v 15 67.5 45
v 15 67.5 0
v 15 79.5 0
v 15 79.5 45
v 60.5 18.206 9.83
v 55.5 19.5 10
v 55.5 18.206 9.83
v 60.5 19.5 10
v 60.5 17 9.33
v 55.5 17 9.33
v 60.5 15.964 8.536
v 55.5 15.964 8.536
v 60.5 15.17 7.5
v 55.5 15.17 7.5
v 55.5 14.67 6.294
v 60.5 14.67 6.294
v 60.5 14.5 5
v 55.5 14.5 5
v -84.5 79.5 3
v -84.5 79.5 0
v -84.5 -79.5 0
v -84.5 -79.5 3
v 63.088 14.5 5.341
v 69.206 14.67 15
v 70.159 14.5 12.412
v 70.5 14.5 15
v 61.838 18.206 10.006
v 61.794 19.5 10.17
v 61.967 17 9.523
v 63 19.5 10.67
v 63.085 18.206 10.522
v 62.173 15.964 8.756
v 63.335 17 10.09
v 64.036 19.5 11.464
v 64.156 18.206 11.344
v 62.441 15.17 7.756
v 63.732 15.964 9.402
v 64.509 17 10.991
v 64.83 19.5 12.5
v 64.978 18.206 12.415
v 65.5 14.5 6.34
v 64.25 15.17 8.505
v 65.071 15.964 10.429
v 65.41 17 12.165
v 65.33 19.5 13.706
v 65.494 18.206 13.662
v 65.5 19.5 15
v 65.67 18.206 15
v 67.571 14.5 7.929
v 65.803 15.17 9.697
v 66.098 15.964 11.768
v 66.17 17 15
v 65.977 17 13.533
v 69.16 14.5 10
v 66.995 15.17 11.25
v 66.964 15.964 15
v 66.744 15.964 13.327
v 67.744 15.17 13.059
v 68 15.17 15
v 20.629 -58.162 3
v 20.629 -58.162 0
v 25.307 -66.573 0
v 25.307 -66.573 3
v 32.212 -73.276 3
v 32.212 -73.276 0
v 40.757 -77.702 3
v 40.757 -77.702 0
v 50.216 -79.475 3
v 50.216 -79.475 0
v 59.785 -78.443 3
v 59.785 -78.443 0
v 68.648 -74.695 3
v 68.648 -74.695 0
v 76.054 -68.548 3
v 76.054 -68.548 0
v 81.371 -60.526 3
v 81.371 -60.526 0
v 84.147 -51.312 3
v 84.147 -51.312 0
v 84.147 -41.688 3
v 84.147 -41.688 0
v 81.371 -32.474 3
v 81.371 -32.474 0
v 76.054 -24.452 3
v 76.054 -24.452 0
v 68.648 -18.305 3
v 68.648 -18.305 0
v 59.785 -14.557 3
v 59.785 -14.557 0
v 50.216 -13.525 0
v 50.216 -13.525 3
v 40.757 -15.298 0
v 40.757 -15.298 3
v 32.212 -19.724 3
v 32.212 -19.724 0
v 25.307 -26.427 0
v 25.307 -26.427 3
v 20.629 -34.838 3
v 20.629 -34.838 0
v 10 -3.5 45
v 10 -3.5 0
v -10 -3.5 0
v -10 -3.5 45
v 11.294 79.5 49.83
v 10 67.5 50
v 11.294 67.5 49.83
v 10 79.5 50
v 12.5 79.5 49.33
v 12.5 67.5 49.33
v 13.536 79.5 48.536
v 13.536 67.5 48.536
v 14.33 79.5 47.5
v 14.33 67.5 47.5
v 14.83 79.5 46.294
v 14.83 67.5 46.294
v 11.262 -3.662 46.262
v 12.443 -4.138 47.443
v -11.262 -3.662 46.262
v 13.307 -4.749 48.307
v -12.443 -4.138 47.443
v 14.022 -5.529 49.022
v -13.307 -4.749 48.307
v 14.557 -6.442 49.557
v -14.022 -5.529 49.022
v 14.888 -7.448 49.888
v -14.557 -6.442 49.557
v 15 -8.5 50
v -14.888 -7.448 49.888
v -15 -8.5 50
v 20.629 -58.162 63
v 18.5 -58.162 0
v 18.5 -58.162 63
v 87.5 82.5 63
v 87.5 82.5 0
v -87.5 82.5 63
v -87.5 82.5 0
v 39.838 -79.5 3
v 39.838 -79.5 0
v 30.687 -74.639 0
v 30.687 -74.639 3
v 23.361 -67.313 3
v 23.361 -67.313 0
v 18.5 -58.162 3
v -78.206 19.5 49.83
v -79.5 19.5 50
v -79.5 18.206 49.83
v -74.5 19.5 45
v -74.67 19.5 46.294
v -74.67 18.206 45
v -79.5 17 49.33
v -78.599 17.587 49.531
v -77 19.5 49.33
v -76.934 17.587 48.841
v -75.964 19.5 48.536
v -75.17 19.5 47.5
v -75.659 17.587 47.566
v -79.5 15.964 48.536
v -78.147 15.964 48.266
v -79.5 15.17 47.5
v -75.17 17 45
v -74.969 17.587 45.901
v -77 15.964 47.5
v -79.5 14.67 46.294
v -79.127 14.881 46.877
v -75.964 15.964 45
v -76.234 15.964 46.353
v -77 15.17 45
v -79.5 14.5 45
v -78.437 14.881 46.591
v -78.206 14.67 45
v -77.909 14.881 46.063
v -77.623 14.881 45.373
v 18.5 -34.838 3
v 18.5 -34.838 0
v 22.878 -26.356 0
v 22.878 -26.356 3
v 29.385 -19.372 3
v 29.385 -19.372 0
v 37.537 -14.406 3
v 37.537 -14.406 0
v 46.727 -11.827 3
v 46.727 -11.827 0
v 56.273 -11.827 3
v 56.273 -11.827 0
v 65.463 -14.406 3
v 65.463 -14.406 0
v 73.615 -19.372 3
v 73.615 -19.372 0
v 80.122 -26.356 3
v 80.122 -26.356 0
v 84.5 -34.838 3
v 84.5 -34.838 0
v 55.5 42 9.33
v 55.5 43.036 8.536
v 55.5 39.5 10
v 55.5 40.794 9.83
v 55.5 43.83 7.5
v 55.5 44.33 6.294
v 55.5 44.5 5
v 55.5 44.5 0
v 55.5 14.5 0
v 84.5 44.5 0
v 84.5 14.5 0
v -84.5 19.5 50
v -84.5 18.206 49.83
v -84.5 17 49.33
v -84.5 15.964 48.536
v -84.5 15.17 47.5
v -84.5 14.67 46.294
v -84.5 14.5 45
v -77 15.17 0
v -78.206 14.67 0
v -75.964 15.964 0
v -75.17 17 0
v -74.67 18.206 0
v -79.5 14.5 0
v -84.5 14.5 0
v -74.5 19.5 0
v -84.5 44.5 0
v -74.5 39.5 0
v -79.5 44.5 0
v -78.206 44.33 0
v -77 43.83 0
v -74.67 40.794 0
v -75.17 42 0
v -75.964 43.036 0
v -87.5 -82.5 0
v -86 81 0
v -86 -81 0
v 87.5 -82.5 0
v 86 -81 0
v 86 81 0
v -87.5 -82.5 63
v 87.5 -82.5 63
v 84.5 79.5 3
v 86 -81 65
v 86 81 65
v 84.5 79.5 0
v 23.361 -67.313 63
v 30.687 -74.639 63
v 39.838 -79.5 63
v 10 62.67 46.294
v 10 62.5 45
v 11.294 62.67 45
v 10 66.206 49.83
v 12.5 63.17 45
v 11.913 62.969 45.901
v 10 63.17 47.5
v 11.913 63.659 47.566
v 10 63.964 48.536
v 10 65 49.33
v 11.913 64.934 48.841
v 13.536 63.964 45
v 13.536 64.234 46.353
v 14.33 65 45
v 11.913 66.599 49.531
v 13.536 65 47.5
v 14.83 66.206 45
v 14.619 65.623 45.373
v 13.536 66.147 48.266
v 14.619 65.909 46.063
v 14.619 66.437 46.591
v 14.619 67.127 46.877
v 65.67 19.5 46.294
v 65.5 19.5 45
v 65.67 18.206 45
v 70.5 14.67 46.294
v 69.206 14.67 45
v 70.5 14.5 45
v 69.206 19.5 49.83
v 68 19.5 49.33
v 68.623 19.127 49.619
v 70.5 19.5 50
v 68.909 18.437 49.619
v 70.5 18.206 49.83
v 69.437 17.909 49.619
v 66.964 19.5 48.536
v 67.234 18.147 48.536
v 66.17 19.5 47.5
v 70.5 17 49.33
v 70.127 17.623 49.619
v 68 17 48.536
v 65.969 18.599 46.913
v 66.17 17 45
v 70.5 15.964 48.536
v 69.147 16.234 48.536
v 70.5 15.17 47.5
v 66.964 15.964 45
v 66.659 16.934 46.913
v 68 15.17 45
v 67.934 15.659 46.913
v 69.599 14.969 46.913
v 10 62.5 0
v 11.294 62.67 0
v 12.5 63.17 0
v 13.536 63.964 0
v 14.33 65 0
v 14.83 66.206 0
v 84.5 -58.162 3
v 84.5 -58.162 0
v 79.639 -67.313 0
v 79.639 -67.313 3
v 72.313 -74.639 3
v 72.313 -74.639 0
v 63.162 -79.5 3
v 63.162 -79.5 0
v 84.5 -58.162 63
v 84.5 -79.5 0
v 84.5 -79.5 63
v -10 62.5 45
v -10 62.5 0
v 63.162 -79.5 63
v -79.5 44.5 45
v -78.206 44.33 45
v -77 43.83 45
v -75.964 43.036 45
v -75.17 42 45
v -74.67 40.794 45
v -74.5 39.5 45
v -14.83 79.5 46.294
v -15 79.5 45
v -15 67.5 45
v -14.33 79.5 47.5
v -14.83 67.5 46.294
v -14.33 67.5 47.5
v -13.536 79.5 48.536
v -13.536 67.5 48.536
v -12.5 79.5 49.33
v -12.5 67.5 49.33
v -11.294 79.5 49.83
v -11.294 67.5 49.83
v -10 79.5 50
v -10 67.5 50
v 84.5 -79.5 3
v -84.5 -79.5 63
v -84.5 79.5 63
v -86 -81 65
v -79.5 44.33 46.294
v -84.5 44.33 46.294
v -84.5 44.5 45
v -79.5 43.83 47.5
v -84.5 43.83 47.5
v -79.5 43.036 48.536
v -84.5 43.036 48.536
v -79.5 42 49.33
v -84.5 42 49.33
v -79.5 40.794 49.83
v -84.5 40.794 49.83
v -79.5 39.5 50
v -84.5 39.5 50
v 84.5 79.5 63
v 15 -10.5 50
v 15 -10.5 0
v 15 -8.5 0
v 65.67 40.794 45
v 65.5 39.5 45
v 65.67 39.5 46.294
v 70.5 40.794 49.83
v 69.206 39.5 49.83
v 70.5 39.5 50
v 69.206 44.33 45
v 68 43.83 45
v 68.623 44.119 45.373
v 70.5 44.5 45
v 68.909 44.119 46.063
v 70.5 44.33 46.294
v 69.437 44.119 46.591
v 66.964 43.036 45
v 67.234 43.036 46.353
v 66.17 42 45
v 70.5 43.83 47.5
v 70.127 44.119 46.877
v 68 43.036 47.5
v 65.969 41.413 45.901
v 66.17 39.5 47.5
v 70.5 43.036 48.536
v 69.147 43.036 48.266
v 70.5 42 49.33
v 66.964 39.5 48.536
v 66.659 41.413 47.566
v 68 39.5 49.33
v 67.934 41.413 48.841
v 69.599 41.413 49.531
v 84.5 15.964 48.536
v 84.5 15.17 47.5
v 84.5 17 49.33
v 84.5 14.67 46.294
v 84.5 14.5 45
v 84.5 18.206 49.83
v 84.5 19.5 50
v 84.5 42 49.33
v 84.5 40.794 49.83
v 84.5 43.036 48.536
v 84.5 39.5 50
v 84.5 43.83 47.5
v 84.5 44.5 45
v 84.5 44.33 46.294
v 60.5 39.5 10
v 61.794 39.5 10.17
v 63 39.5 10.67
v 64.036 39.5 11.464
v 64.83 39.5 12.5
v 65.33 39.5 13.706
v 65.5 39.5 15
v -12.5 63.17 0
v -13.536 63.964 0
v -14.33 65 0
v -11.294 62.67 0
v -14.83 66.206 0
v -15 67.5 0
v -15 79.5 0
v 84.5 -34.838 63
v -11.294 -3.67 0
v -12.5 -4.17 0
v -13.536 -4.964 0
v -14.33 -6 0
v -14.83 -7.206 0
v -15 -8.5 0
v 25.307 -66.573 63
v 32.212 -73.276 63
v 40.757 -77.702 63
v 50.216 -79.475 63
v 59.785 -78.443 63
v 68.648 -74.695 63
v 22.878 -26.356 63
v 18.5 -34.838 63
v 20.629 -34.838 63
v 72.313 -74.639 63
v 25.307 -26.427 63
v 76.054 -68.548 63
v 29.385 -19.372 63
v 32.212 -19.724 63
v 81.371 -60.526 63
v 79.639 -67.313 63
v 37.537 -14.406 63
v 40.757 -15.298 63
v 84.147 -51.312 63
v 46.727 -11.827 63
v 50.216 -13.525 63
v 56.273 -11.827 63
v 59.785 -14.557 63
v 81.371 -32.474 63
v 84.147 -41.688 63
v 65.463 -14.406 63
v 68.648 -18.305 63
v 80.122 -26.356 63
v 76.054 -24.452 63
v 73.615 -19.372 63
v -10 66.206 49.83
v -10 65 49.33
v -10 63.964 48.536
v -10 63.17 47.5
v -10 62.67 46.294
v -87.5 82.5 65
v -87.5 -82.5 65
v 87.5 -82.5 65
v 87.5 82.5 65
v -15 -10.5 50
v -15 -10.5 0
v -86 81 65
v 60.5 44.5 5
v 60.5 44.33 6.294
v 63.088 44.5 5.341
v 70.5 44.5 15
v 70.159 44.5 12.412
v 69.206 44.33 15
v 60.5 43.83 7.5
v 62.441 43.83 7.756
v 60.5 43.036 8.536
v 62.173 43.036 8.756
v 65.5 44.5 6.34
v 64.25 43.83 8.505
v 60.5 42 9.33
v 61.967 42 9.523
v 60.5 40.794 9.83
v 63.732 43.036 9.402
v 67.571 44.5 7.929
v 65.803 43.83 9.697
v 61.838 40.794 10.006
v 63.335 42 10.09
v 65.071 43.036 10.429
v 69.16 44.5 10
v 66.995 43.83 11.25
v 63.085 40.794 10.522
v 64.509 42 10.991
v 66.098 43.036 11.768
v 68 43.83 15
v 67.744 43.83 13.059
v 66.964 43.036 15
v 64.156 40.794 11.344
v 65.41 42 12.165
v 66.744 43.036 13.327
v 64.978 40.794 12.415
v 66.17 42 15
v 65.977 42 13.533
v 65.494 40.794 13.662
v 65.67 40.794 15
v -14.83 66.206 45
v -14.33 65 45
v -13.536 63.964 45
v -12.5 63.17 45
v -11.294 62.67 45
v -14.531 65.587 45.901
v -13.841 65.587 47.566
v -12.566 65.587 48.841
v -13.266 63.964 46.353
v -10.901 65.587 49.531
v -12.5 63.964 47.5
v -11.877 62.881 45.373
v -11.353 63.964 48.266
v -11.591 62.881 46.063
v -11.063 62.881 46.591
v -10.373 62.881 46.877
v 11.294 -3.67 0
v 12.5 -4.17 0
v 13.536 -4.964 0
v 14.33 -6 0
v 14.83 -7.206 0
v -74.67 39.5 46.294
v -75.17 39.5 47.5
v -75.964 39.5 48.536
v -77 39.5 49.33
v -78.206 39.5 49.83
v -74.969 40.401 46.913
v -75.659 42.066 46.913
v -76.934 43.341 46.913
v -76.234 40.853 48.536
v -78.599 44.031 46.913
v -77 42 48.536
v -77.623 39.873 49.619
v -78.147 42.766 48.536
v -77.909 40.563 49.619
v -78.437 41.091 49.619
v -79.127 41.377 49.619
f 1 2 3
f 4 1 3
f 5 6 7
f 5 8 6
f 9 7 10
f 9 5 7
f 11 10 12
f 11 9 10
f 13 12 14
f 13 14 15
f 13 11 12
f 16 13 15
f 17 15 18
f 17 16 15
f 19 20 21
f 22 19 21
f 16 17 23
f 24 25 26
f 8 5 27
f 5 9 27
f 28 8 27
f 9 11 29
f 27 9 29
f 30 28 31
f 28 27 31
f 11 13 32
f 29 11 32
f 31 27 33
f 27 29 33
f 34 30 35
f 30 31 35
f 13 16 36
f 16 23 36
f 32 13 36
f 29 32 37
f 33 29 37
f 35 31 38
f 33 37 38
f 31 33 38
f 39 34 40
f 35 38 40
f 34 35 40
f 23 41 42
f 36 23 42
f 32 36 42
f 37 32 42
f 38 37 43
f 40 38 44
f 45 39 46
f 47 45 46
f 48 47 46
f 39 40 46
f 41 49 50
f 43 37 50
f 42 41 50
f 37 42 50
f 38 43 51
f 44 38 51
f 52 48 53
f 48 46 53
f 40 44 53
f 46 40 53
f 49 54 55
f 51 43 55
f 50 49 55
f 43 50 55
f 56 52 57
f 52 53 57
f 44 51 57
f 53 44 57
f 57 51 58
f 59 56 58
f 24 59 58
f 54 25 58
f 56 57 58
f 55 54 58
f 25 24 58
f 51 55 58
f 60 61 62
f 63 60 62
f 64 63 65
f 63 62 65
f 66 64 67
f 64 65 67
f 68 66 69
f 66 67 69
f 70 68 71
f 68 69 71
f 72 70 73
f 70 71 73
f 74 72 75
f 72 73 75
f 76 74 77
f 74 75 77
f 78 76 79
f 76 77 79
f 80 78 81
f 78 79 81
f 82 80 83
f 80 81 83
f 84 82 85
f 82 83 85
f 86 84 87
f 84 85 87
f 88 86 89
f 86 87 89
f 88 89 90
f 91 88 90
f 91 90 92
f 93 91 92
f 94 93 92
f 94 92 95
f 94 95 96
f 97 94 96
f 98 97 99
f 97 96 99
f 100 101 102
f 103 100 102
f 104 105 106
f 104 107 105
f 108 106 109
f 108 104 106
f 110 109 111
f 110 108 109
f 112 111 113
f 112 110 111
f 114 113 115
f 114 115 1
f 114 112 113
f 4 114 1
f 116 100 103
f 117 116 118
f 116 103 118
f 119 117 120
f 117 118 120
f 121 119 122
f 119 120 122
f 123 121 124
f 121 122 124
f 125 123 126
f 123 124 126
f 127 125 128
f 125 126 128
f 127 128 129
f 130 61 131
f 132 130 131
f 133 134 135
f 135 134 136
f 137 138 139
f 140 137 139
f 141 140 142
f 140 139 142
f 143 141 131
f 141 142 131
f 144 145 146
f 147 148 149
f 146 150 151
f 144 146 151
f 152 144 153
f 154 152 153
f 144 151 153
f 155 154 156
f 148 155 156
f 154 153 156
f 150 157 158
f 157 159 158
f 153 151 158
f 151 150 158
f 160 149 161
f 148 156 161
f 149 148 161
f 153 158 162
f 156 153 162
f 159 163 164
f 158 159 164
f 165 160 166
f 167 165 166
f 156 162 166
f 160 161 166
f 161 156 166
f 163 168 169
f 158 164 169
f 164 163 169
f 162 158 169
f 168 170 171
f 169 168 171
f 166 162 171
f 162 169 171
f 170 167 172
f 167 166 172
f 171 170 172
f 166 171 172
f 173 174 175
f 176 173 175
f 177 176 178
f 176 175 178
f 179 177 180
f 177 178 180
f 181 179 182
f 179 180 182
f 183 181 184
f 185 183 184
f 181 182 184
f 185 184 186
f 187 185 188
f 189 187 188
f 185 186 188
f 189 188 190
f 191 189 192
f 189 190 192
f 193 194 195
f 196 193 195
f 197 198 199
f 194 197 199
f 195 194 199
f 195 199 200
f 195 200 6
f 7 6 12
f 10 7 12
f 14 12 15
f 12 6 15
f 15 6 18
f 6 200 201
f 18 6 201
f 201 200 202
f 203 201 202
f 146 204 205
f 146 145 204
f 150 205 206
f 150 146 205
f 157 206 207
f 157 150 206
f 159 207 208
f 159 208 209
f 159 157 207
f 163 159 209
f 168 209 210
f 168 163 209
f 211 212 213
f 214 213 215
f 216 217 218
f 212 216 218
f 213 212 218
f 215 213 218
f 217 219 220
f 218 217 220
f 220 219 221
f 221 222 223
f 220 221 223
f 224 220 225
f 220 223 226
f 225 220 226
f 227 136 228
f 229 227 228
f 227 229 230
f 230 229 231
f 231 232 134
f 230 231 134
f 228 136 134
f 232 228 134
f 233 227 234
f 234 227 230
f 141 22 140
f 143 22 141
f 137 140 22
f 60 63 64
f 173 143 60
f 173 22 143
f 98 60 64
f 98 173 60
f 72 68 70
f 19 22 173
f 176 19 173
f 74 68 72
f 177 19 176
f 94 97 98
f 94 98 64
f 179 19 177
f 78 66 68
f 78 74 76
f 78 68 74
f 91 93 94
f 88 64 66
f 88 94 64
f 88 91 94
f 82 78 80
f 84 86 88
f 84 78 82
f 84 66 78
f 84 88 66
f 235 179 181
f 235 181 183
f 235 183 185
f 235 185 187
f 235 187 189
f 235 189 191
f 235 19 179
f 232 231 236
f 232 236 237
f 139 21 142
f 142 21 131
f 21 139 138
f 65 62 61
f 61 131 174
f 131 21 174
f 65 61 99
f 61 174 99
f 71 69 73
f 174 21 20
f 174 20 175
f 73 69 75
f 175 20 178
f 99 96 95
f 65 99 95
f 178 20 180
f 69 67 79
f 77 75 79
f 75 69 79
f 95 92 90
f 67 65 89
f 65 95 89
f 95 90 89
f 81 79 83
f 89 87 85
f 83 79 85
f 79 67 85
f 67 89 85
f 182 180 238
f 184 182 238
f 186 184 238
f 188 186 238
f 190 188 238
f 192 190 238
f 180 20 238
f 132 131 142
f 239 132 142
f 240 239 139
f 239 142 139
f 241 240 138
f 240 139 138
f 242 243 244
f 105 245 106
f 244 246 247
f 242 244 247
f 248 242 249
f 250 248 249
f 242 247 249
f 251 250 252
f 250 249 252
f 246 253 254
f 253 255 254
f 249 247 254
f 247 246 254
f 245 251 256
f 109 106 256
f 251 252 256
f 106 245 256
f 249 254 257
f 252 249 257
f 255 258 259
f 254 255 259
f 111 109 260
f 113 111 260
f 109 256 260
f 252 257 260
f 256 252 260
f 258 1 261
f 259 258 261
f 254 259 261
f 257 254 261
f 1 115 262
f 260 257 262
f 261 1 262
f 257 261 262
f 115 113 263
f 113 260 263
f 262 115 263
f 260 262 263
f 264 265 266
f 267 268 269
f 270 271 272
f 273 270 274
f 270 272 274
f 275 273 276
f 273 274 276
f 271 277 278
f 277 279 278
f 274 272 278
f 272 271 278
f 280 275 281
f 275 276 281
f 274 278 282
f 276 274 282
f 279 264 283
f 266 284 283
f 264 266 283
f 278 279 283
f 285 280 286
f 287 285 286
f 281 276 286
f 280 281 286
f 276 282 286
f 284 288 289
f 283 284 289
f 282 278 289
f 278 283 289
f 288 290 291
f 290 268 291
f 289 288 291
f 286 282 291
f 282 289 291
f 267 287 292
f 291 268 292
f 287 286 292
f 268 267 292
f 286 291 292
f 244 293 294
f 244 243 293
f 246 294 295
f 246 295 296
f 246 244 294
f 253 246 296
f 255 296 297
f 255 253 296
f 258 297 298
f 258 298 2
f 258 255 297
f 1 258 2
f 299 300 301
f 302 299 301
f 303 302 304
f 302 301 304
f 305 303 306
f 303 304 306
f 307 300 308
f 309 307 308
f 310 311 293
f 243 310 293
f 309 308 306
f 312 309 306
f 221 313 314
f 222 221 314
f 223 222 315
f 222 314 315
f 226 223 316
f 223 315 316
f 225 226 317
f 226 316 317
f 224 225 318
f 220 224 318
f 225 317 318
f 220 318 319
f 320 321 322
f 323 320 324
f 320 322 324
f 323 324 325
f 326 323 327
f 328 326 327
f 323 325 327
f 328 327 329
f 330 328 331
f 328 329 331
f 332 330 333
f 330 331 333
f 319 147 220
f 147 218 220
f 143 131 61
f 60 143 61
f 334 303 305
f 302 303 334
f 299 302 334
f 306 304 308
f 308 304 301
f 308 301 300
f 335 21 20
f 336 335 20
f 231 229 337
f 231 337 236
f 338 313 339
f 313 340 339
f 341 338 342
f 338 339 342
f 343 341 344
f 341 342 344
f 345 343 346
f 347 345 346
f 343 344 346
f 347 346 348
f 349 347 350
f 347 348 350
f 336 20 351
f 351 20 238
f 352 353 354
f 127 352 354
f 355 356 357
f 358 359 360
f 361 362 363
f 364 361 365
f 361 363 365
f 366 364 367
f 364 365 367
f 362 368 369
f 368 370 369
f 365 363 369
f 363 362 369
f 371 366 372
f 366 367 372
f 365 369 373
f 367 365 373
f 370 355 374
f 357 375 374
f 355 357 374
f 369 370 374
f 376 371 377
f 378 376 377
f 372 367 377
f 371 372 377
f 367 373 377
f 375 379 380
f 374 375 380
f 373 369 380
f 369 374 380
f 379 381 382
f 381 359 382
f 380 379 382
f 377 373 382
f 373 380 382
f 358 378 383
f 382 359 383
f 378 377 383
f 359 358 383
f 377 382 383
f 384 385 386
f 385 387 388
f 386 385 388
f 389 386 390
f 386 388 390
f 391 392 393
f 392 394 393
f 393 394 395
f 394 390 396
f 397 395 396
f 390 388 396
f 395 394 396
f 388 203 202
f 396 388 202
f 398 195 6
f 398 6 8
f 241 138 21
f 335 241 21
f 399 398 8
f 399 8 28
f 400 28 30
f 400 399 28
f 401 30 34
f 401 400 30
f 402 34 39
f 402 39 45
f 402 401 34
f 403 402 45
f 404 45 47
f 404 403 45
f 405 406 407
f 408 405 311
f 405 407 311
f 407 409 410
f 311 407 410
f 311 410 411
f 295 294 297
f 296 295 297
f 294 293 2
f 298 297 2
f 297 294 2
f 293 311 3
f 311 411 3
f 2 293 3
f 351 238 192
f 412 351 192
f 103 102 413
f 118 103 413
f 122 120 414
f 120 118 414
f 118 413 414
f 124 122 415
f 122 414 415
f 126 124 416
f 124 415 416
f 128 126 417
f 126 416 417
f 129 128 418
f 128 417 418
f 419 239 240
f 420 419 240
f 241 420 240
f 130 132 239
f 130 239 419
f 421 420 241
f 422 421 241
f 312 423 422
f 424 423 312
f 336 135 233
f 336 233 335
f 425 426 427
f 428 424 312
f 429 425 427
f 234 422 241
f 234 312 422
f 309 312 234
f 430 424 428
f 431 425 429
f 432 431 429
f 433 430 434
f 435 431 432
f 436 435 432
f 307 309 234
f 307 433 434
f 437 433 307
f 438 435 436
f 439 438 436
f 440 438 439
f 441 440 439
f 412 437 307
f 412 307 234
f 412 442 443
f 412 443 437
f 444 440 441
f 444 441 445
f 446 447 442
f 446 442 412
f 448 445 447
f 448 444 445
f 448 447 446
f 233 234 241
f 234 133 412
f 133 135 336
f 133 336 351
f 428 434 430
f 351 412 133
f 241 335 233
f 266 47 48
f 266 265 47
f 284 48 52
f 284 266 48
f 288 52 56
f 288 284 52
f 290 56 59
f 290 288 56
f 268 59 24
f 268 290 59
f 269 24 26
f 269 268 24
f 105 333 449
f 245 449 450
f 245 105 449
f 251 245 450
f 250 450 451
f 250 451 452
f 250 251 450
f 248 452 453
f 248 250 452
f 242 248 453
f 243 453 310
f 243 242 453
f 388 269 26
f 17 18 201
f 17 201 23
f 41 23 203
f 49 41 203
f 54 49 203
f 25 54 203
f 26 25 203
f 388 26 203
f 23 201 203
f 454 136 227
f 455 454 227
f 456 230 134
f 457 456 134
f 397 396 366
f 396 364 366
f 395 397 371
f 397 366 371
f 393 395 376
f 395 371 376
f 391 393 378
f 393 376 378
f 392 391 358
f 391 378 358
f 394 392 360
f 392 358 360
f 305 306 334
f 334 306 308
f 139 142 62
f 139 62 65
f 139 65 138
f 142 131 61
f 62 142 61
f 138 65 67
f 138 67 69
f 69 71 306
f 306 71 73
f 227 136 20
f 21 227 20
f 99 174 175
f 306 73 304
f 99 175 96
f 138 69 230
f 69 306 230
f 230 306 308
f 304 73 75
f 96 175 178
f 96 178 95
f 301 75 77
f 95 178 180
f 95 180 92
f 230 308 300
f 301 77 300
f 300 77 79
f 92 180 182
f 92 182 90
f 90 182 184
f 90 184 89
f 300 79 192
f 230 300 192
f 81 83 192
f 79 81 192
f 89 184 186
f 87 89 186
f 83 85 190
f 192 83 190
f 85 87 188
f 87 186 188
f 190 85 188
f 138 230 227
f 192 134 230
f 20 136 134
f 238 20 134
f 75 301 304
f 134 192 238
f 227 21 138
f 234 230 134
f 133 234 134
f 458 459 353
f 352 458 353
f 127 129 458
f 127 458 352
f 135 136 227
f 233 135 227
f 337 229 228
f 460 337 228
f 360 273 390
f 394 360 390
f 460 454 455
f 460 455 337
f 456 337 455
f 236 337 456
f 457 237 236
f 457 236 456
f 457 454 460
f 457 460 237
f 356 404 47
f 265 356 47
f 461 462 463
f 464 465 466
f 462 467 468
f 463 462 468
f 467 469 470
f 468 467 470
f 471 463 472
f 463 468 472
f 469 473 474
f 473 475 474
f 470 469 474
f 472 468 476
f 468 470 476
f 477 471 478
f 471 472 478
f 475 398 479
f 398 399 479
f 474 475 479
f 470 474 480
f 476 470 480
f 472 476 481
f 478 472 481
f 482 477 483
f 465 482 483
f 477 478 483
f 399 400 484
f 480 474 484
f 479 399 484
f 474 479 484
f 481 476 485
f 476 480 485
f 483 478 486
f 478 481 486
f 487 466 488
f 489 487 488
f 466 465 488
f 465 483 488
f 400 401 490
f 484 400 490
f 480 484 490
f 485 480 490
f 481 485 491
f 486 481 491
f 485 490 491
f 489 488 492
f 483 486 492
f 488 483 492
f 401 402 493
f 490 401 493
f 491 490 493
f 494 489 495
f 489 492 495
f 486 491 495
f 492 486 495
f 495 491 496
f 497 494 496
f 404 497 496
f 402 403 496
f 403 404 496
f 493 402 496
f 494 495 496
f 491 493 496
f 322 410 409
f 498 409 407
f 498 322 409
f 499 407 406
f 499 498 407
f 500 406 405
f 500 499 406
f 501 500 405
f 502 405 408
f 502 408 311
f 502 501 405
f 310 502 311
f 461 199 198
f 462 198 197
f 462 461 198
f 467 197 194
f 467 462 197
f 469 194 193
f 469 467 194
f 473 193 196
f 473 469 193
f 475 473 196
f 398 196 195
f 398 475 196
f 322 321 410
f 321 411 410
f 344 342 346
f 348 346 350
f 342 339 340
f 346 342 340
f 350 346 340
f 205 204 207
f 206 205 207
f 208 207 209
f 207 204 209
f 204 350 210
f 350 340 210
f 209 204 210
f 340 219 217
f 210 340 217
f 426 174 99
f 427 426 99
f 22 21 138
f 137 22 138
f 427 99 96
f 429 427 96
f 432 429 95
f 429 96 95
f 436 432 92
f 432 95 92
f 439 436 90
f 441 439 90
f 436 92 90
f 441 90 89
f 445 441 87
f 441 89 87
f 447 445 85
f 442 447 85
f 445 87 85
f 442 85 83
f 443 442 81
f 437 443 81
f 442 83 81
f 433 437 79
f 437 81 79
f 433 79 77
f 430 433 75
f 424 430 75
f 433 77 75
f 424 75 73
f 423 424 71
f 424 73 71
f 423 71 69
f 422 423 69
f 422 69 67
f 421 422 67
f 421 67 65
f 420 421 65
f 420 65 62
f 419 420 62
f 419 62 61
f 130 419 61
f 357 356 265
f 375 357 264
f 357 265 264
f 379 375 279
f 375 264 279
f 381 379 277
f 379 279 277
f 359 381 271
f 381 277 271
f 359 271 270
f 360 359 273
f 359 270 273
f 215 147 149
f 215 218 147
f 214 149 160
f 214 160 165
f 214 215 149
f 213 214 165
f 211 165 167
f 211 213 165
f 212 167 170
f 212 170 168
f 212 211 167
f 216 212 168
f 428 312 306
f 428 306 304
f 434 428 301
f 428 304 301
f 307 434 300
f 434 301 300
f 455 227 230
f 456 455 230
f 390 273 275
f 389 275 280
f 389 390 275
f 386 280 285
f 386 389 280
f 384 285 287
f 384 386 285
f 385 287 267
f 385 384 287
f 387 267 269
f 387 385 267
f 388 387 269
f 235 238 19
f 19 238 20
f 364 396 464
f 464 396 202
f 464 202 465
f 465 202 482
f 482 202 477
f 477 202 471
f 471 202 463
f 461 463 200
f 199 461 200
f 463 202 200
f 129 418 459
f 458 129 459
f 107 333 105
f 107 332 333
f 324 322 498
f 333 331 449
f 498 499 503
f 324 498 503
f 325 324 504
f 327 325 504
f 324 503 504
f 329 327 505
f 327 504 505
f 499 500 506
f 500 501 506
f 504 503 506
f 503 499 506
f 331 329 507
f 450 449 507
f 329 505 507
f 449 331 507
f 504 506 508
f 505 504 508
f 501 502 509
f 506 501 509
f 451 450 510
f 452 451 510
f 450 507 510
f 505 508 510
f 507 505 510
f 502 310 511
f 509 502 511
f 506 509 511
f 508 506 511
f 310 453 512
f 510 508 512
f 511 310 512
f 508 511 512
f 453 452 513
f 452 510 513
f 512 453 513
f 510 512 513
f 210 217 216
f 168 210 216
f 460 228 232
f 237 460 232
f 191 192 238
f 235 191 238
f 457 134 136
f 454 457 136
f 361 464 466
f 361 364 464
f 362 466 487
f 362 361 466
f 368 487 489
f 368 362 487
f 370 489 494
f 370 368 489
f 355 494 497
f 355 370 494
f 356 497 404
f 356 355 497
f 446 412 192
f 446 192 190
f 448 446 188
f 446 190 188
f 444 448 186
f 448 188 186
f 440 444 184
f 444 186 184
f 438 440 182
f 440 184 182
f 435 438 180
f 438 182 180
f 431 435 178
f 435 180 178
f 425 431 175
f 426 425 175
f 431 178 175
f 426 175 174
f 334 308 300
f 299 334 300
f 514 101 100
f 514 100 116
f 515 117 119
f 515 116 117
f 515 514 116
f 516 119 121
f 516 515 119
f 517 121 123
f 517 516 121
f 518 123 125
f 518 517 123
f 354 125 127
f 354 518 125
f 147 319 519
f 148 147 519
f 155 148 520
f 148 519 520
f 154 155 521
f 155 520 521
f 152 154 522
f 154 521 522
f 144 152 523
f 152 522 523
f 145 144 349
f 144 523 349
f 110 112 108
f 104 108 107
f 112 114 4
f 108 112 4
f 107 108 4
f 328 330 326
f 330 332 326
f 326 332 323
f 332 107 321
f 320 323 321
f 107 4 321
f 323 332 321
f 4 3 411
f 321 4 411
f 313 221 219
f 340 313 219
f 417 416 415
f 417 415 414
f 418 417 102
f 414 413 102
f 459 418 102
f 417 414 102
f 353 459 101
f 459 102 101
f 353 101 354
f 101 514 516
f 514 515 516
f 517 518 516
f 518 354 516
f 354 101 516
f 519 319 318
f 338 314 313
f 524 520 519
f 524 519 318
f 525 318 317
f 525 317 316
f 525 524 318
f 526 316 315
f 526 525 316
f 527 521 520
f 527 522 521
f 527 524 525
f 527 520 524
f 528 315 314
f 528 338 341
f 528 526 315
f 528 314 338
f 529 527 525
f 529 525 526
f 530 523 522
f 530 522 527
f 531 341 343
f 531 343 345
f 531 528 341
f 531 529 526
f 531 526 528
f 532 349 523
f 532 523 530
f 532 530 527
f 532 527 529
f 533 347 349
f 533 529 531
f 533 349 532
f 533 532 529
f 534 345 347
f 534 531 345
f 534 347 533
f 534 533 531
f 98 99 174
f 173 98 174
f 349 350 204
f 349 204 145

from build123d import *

# Parameters (mm, degrees)
F0_W          = 172
F0_H          = 162
F1_DEPTH      = 63
F2_DEPTH      = 3
F3_DEPTH      = 50
F4_DEPTH      = 10
F5_F1_R       = 5
F5_F2_R       = 5
F5_2_F1_R     = 5
F5_2_F2_R     = 5
F5_2_F3_R     = 5
F5_3_T1_DEPTH = 55
F5_3_T3_DEPTH = 75
F5_4_F1_R     = 5
F5_4_F2_R     = 5
F5_4_F3_R     = 5
F6_DEPTH      = 65


# Not quite as in the source:
# - a fillet or chamfer that OpenCascade refuses, or shapes differently, is made with other operations: its cross-section is extruded or revolved along the edge and cut away or added


with BuildPart() as f1:
    # F0 (on Top) → F1 (new body)
    with BuildSketch(Plane.XY):
        Polygon((-87.5, -82.5), (87.5, -82.5), (87.5, -81), (87.5, 82.5), (0, 82.5), (-87.5, 82.5), align=None)
        Rectangle(F0_W, F0_H, mode=Mode.SUBTRACT)
        Rectangle(F0_W, F0_H)
        with BuildLine():
            Line((84.5, -58.1619037897), (84.5, -79.5))
            Line((84.5, -79.5), (63.1619037897, -79.5))
            ThreePointArc((63.1619037897, -79.5), (76.2487373415, -71.2487373415), (84.5, -58.1619037897))
        make_face(mode=Mode.SUBTRACT)
        with BuildLine():
            Line((-84.5, 44.5), (-84.5, 79.5))
            Line((-84.5, 79.5), (-15, 79.5))
            Line((-15, 79.5), (15, 79.5))
            Line((15, 79.5), (84.5, 79.5))
            Line((84.5, 79.5), (84.5, 44.5))
            Line((84.5, 44.5), (84.5, 14.5))
            Line((84.5, 14.5), (84.5, -34.8380962103))
            ThreePointArc((84.5, -34.8380962103), (51.5, -11.5), (18.5, -34.8380962103))
            Line((18.5, -34.8380962103), (20.6293019191, -34.8380962103))
            ThreePointArc((20.6293019191, -34.8380962103), (84.5, -46.5), (20.6293019191, -58.1619037897))
            Line((20.6293019191, -58.1619037897), (18.5, -58.1619037897))
            ThreePointArc((18.5, -58.1619037897), (26.7512626585, -71.2487373415), (39.8380962103, -79.5))
            Line((39.8380962103, -79.5), (-84.5, -79.5))
            Line((-84.5, -79.5), (-84.5, 14.5))
            Line((-84.5, 14.5), (-84.5, 44.5))
        make_face(mode=Mode.SUBTRACT)
    extrude(amount=F1_DEPTH)


with BuildPart() as f2:
    # F0 (on Top) → F2 (new body)
    with BuildSketch(Plane.XY):
        with BuildLine():
            Line((-15, 79.5), (-84.5, 79.5))
            Line((-84.5, 79.5), (-84.5, 44.5))
            Line((-84.5, 44.5), (-74.5, 44.5))
            Line((-74.5, 44.5), (-74.5, 29.5))
            Line((-74.5, 29.5), (-74.5, 14.5))
            Line((-74.5, 14.5), (-84.5, 14.5))
            Line((-84.5, 14.5), (-84.5, -79.5))
            Line((-84.5, -79.5), (39.8380962103, -79.5))
            ThreePointArc((39.8380962103, -79.5), (26.7512626585, -71.2487373415), (18.5, -58.1619037897))
            Line((18.5, -58.1619037897), (20.6293019191, -58.1619037897))
            ThreePointArc((20.6293019191, -58.1619037897), (84.5, -46.5), (20.6293019191, -34.8380962103))
            Line((20.6293019191, -34.8380962103), (18.5, -34.8380962103))
            ThreePointArc((18.5, -34.8380962103), (51.5, -11.5), (84.5, -34.8380962103))
            Line((84.5, -34.8380962103), (84.5, 14.5))
            Line((84.5, 14.5), (65.5, 14.5))
            Line((65.5, 14.5), (55.5, 14.5))
            Line((55.5, 14.5), (55.5, 44.5))
            Line((55.5, 44.5), (65.5, 44.5))
            Line((65.5, 44.5), (84.5, 44.5))
            Line((84.5, 44.5), (84.5, 79.5))
            Line((84.5, 79.5), (15, 79.5))
            Line((15, 79.5), (15, 62.5))
            Line((15, 62.5), (0, 62.5))
            Line((0, 62.5), (-15, 62.5))
            Line((-15, 62.5), (-15, 79.5))
        make_face()
        Polygon((-15, -3.5), (0, -3.5), (15, -3.5), (15, -10.5), (-15, -10.5), align=None, mode=Mode.SUBTRACT)
        Polygon((-74.5, 44.5), (-84.5, 44.5), (-84.5, 14.5), (-74.5, 14.5), (-74.5, 29.5), align=None)
        Polygon((15, 79.5), (-15, 79.5), (-15, 62.5), (0, 62.5), (15, 62.5), align=None)
        Polygon((65.5, 29.5), (65.5, 44.5), (55.5, 44.5), (55.5, 14.5), (65.5, 14.5), align=None)
        Polygon((84.5, 14.5), (84.5, 44.5), (65.5, 44.5), (65.5, 29.5), (65.5, 14.5), align=None)
        Polygon((15, -3.5), (0, -3.5), (-15, -3.5), (-15, -10.5), (15, -10.5), align=None)
    extrude(amount=F2_DEPTH)


with BuildPart() as f2b:
    # F0 (on Top) → F2, piece 2 (new body)
    with BuildSketch(Plane.XY):
        with BuildLine():
            Line((63.1619037897, -79.5), (84.5, -79.5))
            Line((84.5, -79.5), (84.5, -58.1619037897))
            ThreePointArc((84.5, -58.1619037897), (76.2487373415, -71.2487373415), (63.1619037897, -79.5))
        make_face()
    extrude(amount=F2_DEPTH)


with BuildPart() as f3:
    # F0 (on Top) → F3 (new body)
    with BuildSketch(Plane.XY):
        Polygon((84.5, 14.5), (84.5, 44.5), (65.5, 44.5), (65.5, 29.5), (65.5, 14.5), align=None)
    extrude(amount=F3_DEPTH)

    # F0 (on Top) → F4 (join)
    with BuildSketch(Plane.XY):
        Polygon((65.5, 29.5), (65.5, 44.5), (55.5, 44.5), (55.5, 14.5), (65.5, 14.5), align=None)
    extrude(amount=F4_DEPTH)

    # F5: fillet of radius 5 on 6 edges, made by hand

    # F5_f1
    f5_f1_edges = [f3.edges().sort_by_distance(p)[0] for p in [
        (65.5, 29.5, 10),
    ]]
    fillet(f5_f1_edges, radius=F5_F1_R)

    # F5_f2
    f5_f2_edges = [f3.edges().sort_by_distance(p)[0] for p in [
        (65.5, 14.5, 32.5),
        (65.5, 29.5, 50),
        (65.5, 44.5, 32.5),
        (75, 14.5, 50),
        (75, 44.5, 50),
        (64.0355339059, 44.5, 11.4644660941),
        (64.0355339059, 14.5, 11.4644660941),
    ]]
    fillet(f5_f2_edges, radius=F5_F2_R)


with BuildPart() as f3b:
    # F0 (on Top) → F3, piece 2 (new body)
    with BuildSketch(Plane.XY):
        Polygon((15, 79.5), (-15, 79.5), (-15, 62.5), (0, 62.5), (15, 62.5), align=None)
    extrude(amount=F3_DEPTH)

    # F5#2: fillet of radius 5 on 5 edges, made by hand

    # F5_2_f1
    f5_2_f1_edges = [f3b.edges().sort_by_distance(p)[0] for p in [
        (-15, 71, 50),
    ]]
    fillet(f5_2_f1_edges, radius=F5_2_F1_R)

    # F5_2_f2
    f5_2_f2_edges = [f3b.edges().sort_by_distance(p)[0] for p in [
        (2.5, 62.5, 50),
    ]]
    fillet(f5_2_f2_edges, radius=F5_2_F2_R)

    # F5_2_f3
    f5_2_f3_edges = [f3b.edges().sort_by_distance(p)[0] for p in [
        (15, 73.5, 50),
    ]]
    fillet(f5_2_f3_edges, radius=F5_2_F3_R)


with BuildPart() as f3c:
    # F0 (on Top) → F3, piece 3 (new body)
    with BuildSketch(Plane.XY):
        Polygon((15, -3.5), (0, -3.5), (-15, -3.5), (-15, -10.5), (15, -10.5), align=None)
    extrude(amount=F3_DEPTH)

    # F5#3: fillet of radius 5 on 3 edges, made by hand

    # F5_3_s2 → F5_3_t1 (cut)
    with BuildSketch(Plane.YZ.offset(-27.5)):
        with BuildLine():
            ThreePointArc((-3.5, 45), (-4.9644660941, 48.5355339059), (-8.5, 50))
            Line((-8.5, 50), (-3.5, 50))
            Line((-3.5, 50), (-3.5, 45))
        make_face()
    extrude(amount=F5_3_T1_DEPTH, mode=Mode.SUBTRACT)

    # F5_3_s4 → F5_3_t3 (cut)
    with BuildSketch(Plane.XY.offset(-12.5)):
        with BuildLine():
            ThreePointArc((-10, -3.5), (-13.5355339059, -4.9644660941), (-15, -8.5))
            Line((-15, -8.5), (-15, -3.5))
            Line((-15, -3.5), (-10, -3.5))
        make_face()
        with BuildLine():
            ThreePointArc((10, -3.5), (13.5355339059, -4.9644660941), (15, -8.5))
            Line((15, -8.5), (15, -3.5))
            Line((15, -3.5), (10, -3.5))
        make_face()
    extrude(amount=F5_3_T3_DEPTH, mode=Mode.SUBTRACT)


with BuildPart() as f3d:
    # F0 (on Top) → F3, piece 4 (new body)
    with BuildSketch(Plane.XY):
        Polygon((-74.5, 44.5), (-84.5, 44.5), (-84.5, 14.5), (-74.5, 14.5), (-74.5, 29.5), align=None)
    extrude(amount=F3_DEPTH)

    # F5#4: fillet of radius 5 on 5 edges, made by hand

    # F5_4_f1
    f5_4_f1_edges = [f3d.edges().sort_by_distance(p)[0] for p in [
        (-74.5, 44.5, 25),
    ]]
    fillet(f5_4_f1_edges, radius=F5_4_F1_R)

    # F5_4_f2
    f5_4_f2_edges = [f3d.edges().sort_by_distance(p)[0] for p in [
        (-82, 44.5, 50),
    ]]
    fillet(f5_4_f2_edges, radius=F5_4_F2_R)

    # F5_4_f3
    f5_4_f3_edges = [f3d.edges().sort_by_distance(p)[0] for p in [
        (-82, 14.5, 50),
    ]]
    fillet(f5_4_f3_edges, radius=F5_4_F3_R)


with BuildPart() as f6:
    # F0 (on Top) → F6 (new body)
    with BuildSketch(Plane.XY):
        Polygon((-87.5, -82.5), (87.5, -82.5), (87.5, -81), (87.5, 82.5), (0, 82.5), (-87.5, 82.5), align=None)
        Rectangle(F0_W, F0_H, mode=Mode.SUBTRACT)
    extrude(amount=F6_DEPTH)


solid = Compound([f1.part, f2.part, f2b.part, f3.part, f3b.part, f3c.part, f3d.part, f6.part])
